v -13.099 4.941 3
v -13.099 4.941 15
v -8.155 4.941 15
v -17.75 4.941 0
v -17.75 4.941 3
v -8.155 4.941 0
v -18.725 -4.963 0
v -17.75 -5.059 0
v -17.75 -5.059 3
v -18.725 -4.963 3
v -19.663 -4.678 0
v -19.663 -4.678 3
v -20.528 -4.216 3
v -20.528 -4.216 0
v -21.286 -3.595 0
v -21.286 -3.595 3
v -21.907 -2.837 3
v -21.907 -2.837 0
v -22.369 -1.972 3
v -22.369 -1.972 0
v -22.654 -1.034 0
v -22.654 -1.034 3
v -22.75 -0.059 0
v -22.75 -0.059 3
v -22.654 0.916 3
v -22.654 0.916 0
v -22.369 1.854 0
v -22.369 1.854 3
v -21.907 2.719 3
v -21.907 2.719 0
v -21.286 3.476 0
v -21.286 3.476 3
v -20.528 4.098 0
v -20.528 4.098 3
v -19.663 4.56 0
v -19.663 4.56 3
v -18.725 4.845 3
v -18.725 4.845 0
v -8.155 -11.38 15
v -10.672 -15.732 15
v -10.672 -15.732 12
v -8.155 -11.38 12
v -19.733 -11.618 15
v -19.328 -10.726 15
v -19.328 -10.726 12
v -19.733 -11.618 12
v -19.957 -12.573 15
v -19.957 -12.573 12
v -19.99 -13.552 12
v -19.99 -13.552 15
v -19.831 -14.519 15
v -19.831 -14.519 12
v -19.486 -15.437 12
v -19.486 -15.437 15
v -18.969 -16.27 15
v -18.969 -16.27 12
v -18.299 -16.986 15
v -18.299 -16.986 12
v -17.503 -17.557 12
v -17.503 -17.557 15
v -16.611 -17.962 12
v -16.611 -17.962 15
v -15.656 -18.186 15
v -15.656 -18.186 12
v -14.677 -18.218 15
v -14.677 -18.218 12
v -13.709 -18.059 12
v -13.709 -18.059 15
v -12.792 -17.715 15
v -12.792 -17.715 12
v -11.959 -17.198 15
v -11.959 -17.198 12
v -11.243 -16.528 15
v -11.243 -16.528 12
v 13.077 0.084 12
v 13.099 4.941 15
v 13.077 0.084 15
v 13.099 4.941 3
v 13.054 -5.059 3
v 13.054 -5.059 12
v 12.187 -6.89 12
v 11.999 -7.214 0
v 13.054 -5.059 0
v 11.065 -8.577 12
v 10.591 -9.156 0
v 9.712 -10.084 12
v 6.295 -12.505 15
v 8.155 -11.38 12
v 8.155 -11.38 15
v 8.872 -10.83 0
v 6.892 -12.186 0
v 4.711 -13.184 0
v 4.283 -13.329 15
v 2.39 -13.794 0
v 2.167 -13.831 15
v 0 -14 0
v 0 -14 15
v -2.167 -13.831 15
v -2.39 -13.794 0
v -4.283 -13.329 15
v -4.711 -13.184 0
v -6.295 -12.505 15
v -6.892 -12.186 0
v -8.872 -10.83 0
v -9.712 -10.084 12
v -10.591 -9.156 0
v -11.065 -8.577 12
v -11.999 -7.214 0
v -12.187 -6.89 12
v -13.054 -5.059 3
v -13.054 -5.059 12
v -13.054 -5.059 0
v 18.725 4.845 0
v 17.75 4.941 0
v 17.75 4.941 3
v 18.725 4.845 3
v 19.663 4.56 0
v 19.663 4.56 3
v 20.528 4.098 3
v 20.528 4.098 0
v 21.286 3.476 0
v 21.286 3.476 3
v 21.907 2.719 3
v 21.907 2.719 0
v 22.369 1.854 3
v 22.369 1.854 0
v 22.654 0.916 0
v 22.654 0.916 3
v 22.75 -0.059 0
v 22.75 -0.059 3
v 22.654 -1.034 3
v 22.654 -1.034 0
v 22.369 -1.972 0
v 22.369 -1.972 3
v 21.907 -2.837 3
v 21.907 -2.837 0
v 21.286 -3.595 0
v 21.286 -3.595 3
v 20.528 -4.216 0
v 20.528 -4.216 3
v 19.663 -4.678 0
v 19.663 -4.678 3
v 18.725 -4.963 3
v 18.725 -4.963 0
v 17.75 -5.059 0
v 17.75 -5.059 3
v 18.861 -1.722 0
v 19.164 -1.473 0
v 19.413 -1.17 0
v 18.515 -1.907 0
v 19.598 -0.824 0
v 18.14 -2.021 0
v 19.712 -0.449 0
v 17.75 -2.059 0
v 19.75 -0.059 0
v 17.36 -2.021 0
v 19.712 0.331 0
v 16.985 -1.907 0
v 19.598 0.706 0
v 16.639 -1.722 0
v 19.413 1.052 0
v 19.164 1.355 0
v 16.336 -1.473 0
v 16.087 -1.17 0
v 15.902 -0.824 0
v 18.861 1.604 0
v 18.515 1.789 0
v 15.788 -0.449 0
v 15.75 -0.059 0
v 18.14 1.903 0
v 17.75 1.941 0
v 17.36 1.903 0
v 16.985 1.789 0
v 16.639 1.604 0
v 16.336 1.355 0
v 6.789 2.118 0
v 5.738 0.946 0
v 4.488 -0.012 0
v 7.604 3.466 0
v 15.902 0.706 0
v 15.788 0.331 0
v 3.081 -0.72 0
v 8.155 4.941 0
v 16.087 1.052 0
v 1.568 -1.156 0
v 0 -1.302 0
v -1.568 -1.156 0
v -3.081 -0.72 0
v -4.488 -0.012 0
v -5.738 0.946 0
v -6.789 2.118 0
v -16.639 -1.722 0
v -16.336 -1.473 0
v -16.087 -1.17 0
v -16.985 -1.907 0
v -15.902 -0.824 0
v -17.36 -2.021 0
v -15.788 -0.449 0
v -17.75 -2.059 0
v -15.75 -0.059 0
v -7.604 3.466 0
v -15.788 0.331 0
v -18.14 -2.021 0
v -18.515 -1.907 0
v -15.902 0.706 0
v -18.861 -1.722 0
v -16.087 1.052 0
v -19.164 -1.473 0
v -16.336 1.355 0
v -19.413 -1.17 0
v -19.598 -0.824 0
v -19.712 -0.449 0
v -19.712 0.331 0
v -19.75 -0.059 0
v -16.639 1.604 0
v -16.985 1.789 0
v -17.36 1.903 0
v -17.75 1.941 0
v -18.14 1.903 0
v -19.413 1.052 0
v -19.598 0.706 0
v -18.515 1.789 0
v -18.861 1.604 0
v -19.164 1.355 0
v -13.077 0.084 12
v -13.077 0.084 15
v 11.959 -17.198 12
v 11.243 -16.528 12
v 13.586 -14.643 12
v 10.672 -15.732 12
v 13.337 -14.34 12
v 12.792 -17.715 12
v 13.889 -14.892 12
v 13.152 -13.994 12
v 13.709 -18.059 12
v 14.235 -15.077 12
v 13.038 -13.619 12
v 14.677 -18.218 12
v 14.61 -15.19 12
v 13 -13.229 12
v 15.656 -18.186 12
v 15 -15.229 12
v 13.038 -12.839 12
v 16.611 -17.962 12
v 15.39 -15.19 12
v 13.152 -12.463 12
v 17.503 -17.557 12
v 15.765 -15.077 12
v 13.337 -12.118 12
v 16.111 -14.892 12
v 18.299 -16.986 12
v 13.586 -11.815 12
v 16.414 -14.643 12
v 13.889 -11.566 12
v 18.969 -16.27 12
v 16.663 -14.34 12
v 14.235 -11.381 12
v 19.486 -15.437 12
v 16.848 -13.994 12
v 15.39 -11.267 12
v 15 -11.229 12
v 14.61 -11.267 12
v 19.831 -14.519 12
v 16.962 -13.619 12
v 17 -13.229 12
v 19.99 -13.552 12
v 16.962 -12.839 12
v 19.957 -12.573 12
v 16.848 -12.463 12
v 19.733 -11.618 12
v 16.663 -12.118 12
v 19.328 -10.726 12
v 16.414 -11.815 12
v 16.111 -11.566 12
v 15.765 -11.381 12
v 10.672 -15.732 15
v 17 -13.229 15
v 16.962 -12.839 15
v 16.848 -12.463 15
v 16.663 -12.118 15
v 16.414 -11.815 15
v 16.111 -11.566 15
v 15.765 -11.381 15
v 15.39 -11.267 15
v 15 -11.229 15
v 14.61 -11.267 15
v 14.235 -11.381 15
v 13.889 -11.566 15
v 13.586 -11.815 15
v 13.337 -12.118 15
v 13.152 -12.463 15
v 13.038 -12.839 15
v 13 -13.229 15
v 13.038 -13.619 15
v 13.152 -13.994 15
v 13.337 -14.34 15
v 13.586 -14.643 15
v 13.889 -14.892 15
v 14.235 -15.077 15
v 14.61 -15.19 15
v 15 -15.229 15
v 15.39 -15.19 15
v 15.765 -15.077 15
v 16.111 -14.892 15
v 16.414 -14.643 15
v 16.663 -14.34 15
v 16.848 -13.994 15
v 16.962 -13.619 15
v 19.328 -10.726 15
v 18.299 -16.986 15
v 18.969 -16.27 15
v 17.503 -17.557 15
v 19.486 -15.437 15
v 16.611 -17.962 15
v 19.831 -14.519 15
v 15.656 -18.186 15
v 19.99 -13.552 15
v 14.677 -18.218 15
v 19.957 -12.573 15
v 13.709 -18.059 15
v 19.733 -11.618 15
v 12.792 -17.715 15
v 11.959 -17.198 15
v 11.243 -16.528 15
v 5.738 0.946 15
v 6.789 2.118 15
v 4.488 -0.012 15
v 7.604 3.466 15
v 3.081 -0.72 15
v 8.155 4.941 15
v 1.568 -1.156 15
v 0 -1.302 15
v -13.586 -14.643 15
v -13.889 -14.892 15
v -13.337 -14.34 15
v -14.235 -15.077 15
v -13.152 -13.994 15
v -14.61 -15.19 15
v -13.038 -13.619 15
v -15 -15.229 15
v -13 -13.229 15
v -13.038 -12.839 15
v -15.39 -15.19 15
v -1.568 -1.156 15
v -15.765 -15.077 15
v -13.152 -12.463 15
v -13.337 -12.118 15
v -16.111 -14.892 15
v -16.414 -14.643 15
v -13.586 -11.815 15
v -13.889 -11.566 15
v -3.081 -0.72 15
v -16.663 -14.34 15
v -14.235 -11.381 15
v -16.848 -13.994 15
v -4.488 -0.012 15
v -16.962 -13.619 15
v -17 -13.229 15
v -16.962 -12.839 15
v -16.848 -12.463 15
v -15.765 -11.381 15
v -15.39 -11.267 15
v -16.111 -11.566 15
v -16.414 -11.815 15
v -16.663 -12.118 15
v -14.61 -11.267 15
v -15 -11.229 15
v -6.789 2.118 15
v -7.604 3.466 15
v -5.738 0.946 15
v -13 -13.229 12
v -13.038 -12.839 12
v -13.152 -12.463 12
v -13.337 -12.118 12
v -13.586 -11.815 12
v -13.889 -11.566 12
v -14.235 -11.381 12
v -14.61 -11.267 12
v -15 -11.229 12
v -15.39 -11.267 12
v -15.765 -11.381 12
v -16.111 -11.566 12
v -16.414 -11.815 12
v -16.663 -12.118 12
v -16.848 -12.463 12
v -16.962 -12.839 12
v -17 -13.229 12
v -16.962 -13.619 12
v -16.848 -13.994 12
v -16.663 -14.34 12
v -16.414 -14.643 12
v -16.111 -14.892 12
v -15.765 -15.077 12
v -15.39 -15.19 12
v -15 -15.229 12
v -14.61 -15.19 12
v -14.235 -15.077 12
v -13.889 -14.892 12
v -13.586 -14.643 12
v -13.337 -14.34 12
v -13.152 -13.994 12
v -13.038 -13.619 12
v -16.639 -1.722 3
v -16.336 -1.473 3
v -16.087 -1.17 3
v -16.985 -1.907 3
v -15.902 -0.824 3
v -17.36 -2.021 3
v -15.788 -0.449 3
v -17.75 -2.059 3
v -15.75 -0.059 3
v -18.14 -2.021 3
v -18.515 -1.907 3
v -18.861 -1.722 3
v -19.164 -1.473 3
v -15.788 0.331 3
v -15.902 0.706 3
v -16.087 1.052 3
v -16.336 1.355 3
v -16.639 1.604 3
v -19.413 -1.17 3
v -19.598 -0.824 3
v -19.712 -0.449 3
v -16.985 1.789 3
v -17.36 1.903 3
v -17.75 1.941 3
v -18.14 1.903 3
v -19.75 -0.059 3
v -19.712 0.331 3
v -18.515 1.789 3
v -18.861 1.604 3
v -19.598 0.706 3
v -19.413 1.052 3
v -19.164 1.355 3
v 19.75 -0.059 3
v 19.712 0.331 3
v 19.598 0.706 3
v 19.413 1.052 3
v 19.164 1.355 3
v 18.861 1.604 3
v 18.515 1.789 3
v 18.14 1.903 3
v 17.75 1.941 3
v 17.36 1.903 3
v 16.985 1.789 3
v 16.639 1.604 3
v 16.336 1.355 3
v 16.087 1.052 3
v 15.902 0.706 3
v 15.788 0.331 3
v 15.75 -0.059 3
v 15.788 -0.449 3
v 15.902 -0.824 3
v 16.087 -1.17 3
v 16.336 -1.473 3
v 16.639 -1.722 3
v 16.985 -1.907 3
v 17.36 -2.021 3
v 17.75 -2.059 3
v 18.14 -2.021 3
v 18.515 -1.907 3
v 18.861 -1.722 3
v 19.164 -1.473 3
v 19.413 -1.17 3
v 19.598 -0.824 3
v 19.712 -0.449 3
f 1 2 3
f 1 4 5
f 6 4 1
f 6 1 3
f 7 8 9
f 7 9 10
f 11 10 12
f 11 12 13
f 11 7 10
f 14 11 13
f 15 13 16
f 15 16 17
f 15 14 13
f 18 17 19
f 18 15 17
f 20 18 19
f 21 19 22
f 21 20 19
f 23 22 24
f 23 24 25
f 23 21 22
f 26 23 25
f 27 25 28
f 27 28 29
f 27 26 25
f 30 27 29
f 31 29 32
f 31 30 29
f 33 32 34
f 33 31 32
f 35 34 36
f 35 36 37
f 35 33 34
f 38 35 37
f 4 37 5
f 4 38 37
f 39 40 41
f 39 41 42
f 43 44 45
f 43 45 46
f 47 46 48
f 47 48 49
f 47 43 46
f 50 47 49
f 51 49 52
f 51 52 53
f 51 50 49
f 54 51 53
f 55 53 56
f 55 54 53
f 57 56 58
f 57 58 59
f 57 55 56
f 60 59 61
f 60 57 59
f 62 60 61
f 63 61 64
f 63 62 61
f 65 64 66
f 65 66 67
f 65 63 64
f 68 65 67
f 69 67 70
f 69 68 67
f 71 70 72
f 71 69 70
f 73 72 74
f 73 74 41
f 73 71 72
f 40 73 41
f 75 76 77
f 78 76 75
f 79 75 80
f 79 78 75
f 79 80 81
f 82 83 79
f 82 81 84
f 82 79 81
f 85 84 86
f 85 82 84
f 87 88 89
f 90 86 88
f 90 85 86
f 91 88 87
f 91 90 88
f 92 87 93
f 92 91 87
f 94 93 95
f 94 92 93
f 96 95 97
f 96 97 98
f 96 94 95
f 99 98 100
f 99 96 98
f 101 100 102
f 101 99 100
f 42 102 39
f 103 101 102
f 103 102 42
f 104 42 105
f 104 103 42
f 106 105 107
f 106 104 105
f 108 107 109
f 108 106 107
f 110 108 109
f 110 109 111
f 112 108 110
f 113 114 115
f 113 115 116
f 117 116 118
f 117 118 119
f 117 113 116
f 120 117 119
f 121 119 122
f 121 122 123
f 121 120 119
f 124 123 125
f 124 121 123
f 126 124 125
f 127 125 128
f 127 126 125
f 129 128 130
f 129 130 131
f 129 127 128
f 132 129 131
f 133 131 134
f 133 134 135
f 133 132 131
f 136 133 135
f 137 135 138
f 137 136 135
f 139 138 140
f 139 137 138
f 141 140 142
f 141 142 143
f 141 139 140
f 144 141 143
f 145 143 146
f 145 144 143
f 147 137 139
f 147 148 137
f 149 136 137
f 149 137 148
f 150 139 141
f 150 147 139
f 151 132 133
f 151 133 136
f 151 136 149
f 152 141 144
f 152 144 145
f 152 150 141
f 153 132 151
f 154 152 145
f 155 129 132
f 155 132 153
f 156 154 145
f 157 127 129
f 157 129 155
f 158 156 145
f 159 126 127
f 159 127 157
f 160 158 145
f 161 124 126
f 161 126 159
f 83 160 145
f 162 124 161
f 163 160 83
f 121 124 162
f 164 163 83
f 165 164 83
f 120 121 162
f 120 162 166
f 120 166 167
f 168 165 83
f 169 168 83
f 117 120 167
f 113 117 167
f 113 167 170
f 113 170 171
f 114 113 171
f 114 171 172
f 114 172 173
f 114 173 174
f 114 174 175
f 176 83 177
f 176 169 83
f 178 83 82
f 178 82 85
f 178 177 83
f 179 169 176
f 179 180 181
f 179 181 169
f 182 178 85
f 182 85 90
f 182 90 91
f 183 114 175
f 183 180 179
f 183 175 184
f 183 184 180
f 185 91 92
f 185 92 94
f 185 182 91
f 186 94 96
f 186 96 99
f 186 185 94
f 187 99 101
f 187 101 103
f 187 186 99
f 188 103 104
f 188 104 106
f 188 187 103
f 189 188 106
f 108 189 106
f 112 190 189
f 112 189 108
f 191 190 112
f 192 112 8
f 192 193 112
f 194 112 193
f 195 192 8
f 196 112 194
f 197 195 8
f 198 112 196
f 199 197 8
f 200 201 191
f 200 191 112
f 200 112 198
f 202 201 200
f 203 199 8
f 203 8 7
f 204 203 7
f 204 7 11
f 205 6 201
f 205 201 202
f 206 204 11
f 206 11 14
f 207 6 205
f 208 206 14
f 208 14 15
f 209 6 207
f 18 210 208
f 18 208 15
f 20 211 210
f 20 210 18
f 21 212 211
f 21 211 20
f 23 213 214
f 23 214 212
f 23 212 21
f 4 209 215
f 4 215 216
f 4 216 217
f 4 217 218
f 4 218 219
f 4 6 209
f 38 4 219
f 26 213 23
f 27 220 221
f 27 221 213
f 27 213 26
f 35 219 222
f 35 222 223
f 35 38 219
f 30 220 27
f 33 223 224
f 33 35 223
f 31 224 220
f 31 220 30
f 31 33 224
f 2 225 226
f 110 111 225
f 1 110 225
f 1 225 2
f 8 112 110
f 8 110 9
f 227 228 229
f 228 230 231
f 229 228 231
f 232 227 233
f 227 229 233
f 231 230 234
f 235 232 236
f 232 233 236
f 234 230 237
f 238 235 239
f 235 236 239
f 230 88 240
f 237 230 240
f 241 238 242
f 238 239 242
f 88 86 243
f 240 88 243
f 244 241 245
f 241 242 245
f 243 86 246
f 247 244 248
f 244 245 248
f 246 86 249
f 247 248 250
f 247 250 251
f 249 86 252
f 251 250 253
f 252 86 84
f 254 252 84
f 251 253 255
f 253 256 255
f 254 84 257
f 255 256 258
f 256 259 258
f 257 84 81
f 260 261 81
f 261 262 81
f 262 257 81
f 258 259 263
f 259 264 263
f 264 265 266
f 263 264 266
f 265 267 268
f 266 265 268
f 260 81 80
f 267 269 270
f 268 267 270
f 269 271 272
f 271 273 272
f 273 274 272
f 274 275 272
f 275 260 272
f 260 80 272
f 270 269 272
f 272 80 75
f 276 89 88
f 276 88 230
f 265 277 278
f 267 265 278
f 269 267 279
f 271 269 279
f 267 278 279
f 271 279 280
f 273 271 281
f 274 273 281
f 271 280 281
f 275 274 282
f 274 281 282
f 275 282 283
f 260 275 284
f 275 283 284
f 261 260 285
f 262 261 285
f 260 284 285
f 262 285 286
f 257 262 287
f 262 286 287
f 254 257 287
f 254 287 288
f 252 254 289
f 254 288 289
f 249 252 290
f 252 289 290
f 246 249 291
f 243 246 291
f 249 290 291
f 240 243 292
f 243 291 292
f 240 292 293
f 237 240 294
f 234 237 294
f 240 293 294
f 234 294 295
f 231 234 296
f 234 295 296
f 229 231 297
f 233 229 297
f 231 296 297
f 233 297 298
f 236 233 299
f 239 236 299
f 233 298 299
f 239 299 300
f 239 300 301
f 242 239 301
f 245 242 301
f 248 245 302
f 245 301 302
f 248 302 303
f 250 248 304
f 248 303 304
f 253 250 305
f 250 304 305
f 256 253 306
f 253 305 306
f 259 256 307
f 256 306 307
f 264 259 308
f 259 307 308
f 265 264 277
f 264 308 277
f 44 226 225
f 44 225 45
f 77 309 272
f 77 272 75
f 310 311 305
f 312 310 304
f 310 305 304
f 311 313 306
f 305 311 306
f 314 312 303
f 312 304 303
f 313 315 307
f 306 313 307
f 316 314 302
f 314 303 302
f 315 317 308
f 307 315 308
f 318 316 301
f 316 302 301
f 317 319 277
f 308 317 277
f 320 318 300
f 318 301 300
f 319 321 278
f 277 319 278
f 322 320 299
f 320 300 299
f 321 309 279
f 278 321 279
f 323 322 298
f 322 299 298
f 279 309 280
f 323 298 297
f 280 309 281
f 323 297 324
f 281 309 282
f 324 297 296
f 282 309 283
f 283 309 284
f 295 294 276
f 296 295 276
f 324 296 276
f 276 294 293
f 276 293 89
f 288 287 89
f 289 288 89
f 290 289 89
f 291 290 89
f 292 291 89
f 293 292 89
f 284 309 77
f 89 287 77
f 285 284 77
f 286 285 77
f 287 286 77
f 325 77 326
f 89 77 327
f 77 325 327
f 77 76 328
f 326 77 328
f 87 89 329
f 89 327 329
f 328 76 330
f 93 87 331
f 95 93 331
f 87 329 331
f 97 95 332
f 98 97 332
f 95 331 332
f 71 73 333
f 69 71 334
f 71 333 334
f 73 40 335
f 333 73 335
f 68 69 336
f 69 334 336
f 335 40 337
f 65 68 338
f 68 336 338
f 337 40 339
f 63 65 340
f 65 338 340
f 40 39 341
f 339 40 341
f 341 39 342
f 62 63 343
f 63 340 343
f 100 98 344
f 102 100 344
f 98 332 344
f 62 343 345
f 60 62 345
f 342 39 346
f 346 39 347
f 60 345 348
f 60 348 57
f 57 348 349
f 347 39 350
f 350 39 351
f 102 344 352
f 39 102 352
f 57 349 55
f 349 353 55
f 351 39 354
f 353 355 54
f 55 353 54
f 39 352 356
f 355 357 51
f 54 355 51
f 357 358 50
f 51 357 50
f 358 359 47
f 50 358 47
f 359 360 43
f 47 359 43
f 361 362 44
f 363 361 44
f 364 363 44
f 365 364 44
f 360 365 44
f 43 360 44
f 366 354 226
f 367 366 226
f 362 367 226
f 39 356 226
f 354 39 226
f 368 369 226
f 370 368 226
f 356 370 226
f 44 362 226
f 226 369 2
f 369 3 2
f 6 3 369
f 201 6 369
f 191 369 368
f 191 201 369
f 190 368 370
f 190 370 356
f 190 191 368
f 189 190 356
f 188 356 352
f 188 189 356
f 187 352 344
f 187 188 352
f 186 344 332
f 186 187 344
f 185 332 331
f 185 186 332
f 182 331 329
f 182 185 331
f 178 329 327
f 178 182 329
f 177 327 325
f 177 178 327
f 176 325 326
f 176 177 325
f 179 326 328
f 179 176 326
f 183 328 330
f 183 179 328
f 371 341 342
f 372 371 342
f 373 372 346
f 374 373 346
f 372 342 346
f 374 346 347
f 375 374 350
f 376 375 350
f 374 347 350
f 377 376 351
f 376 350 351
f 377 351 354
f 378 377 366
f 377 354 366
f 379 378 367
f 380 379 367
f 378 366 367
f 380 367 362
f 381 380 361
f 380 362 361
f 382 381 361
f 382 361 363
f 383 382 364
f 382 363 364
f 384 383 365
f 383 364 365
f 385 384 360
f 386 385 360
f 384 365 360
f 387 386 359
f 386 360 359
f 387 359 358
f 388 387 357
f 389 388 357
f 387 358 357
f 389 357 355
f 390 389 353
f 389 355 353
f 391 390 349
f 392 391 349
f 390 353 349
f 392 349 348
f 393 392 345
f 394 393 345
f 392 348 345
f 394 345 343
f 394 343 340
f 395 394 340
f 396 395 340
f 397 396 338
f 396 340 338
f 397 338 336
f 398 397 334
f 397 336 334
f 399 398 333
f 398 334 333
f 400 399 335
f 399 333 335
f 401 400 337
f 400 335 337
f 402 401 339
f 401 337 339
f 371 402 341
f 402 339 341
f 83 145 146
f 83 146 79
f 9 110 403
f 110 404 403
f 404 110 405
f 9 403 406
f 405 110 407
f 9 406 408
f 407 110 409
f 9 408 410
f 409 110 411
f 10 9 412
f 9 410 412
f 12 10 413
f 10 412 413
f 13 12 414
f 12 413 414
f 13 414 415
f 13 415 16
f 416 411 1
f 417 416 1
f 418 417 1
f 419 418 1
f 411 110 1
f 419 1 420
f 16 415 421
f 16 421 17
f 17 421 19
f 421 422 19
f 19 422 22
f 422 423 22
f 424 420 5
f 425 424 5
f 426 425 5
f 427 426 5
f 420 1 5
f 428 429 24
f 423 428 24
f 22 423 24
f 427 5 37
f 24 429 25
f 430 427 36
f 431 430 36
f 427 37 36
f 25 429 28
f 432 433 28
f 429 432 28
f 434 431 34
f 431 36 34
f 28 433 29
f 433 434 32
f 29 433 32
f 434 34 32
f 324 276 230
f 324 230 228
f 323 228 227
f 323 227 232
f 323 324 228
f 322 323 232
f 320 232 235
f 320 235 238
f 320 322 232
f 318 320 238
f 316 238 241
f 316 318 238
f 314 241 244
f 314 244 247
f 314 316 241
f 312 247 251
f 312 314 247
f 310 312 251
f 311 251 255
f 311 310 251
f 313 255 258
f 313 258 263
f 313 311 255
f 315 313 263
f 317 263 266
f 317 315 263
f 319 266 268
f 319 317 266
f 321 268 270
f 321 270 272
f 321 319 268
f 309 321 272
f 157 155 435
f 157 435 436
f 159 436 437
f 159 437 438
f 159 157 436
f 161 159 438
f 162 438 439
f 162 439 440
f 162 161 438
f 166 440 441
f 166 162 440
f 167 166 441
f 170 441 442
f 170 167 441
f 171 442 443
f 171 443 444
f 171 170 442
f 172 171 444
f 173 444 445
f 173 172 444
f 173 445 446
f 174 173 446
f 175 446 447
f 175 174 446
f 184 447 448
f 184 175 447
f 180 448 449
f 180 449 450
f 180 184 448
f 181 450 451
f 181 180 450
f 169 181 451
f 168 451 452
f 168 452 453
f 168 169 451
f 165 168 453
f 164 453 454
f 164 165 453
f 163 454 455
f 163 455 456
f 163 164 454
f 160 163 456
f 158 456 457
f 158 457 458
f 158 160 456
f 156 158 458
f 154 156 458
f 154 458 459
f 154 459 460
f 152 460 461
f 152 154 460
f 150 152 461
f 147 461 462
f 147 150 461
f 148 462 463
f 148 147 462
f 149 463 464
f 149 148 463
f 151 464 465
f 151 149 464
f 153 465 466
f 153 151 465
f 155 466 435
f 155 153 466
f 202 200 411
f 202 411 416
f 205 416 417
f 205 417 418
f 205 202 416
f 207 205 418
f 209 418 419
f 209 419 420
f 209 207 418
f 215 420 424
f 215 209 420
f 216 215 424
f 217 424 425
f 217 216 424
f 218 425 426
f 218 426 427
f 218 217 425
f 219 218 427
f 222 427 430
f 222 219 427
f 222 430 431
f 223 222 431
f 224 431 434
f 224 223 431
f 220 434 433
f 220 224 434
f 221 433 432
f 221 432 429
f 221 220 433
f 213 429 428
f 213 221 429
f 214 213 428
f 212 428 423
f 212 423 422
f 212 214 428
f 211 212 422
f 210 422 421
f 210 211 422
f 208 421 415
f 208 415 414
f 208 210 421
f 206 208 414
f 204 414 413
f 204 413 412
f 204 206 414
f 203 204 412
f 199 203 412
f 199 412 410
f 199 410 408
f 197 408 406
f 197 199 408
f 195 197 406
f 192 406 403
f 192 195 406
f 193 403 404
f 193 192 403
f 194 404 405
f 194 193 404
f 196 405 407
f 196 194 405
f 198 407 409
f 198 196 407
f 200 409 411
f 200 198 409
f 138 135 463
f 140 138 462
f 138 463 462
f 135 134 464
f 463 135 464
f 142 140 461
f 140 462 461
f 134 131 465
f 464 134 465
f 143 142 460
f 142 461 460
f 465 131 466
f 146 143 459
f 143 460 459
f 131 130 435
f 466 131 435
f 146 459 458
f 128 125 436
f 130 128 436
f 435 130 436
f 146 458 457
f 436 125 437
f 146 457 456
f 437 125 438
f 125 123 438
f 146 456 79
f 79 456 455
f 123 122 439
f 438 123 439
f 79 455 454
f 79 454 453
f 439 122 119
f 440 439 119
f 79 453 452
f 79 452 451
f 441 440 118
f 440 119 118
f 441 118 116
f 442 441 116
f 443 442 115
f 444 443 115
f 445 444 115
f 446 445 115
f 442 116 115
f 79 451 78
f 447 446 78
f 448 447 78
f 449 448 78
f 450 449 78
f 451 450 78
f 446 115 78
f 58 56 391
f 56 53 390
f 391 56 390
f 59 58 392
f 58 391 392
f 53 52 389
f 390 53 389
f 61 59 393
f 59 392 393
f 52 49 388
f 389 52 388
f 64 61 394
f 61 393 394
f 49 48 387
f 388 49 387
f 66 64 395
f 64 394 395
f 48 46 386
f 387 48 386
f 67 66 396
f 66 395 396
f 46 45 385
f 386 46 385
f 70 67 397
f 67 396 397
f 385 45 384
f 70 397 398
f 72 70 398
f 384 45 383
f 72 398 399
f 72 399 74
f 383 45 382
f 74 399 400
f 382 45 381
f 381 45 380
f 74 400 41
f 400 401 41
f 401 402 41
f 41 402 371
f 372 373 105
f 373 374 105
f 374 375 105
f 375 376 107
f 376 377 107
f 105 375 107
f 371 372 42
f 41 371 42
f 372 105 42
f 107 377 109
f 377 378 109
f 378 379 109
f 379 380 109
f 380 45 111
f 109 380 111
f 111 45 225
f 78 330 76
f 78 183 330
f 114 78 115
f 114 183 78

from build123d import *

# Parameters (mm, degrees)
ESBO_O1_R                = 2
RESSALTO_EXTRUS_O1_DEPTH = 3
RESSALTO_EXTRUS_O2_DEPTH = 12
ESBO_O3_R                = 2
RESSALTO_EXTRUS_O3_DEPTH = 3


with BuildPart() as part:
    # Esboço1 → Ressalto-extrusão1 (new body)
    with BuildSketch(Plane.XY):
        with BuildLine():
            Line((-17.75, 4.940964043), (-13.099117311, 4.940964043))
            Line((-13.099117311, 4.940964043), (-8.154782397, 4.940964043))
            ThreePointArc((-8.154782397, 4.940964043), (0, -1.302389684), (8.154782397, 4.940964043))
            Line((8.154782397, 4.940964043), (13.099117311, 4.940964043))
            Line((13.099117311, 4.940964043), (17.75, 4.940964043))
            ThreePointArc((17.75, 4.940964043), (22.75, -0.059035957), (17.75, -5.059035957))
            Line((17.75, -5.059035957), (13.053970859, -5.059035957))
            ThreePointArc((13.053970859, -5.059035957), (0, -14), (-13.053970859, -5.059035957))
            Line((-13.053970859, -5.059035957), (-17.75, -5.059035957))
            ThreePointArc((-17.75, -5.059035957), (-22.75, -0.059035957), (-17.75, 4.940964043))
        make_face()
        with Locations((-17.75, -0.059035957)):
            Circle(ESBO_O1_R, mode=Mode.SUBTRACT)
        with Locations((17.75, -0.059035957)):
            Circle(ESBO_O1_R, mode=Mode.SUBTRACT)
    extrude(amount=RESSALTO_EXTRUS_O1_DEPTH)

    # Esboço2 → Ressalto-extrusão2 (add)
    with BuildSketch(Plane.XY.offset(3)):
        with BuildLine():
            Line((13.099117311, 4.940964043), (13.053970859, -5.059035957))
            ThreePointArc((13.053970859, -5.059035957), (0, -14), (-13.053970859, -5.059035957))
            Line((-13.053970859, -5.059035957), (-13.099117311, 4.940964043))
            Line((-13.099117311, 4.940964043), (-8.154782397, 4.940964043))
            ThreePointArc((-8.154782397, 4.940964043), (0, -1.302389684), (8.154782397, 4.940964043))
            Line((8.154782397, 4.940964043), (13.099117311, 4.940964043))
        make_face()
    extrude(amount=RESSALTO_EXTRUS_O2_DEPTH)

    # Esboço3 → Ressalto-extrusão3 (add)
    with BuildSketch(Plane.XY.offset(15)):
        with BuildLine():
            Line((13.077187708, 0.083527365), (8.154782397, -11.379785765))
            Line((8.154782397, -11.379785765), (10.671688275, -15.731898104))
            ThreePointArc((10.671688275, -15.731898104), (17.503141549, -17.55706828), (19.328311725, -10.725615007))
            Line((19.328311725, -10.725615007), (13.077187708, 0.083527365))
        make_face()
        with Locations((15, -13.228756555)):
            Circle(ESBO_O3_R, mode=Mode.SUBTRACT)
        with BuildLine():
            Line((-10.671688275, -15.731898104), (-8.154782397, -11.379785765))
            Line((-8.154782397, -11.379785765), (-13.077187708, 0.083527365))
            Line((-13.077187708, 0.083527365), (-19.328311725, -10.725615007))
            ThreePointArc((-19.328311725, -10.725615007), (-17.503141549, -17.55706828), (-10.671688275, -15.731898104))
        make_face()
        with Locations((-15, -13.228756555)):
            Circle(ESBO_O3_R, mode=Mode.SUBTRACT)
    extrude(amount=-RESSALTO_EXTRUS_O3_DEPTH)


solid = part.part
